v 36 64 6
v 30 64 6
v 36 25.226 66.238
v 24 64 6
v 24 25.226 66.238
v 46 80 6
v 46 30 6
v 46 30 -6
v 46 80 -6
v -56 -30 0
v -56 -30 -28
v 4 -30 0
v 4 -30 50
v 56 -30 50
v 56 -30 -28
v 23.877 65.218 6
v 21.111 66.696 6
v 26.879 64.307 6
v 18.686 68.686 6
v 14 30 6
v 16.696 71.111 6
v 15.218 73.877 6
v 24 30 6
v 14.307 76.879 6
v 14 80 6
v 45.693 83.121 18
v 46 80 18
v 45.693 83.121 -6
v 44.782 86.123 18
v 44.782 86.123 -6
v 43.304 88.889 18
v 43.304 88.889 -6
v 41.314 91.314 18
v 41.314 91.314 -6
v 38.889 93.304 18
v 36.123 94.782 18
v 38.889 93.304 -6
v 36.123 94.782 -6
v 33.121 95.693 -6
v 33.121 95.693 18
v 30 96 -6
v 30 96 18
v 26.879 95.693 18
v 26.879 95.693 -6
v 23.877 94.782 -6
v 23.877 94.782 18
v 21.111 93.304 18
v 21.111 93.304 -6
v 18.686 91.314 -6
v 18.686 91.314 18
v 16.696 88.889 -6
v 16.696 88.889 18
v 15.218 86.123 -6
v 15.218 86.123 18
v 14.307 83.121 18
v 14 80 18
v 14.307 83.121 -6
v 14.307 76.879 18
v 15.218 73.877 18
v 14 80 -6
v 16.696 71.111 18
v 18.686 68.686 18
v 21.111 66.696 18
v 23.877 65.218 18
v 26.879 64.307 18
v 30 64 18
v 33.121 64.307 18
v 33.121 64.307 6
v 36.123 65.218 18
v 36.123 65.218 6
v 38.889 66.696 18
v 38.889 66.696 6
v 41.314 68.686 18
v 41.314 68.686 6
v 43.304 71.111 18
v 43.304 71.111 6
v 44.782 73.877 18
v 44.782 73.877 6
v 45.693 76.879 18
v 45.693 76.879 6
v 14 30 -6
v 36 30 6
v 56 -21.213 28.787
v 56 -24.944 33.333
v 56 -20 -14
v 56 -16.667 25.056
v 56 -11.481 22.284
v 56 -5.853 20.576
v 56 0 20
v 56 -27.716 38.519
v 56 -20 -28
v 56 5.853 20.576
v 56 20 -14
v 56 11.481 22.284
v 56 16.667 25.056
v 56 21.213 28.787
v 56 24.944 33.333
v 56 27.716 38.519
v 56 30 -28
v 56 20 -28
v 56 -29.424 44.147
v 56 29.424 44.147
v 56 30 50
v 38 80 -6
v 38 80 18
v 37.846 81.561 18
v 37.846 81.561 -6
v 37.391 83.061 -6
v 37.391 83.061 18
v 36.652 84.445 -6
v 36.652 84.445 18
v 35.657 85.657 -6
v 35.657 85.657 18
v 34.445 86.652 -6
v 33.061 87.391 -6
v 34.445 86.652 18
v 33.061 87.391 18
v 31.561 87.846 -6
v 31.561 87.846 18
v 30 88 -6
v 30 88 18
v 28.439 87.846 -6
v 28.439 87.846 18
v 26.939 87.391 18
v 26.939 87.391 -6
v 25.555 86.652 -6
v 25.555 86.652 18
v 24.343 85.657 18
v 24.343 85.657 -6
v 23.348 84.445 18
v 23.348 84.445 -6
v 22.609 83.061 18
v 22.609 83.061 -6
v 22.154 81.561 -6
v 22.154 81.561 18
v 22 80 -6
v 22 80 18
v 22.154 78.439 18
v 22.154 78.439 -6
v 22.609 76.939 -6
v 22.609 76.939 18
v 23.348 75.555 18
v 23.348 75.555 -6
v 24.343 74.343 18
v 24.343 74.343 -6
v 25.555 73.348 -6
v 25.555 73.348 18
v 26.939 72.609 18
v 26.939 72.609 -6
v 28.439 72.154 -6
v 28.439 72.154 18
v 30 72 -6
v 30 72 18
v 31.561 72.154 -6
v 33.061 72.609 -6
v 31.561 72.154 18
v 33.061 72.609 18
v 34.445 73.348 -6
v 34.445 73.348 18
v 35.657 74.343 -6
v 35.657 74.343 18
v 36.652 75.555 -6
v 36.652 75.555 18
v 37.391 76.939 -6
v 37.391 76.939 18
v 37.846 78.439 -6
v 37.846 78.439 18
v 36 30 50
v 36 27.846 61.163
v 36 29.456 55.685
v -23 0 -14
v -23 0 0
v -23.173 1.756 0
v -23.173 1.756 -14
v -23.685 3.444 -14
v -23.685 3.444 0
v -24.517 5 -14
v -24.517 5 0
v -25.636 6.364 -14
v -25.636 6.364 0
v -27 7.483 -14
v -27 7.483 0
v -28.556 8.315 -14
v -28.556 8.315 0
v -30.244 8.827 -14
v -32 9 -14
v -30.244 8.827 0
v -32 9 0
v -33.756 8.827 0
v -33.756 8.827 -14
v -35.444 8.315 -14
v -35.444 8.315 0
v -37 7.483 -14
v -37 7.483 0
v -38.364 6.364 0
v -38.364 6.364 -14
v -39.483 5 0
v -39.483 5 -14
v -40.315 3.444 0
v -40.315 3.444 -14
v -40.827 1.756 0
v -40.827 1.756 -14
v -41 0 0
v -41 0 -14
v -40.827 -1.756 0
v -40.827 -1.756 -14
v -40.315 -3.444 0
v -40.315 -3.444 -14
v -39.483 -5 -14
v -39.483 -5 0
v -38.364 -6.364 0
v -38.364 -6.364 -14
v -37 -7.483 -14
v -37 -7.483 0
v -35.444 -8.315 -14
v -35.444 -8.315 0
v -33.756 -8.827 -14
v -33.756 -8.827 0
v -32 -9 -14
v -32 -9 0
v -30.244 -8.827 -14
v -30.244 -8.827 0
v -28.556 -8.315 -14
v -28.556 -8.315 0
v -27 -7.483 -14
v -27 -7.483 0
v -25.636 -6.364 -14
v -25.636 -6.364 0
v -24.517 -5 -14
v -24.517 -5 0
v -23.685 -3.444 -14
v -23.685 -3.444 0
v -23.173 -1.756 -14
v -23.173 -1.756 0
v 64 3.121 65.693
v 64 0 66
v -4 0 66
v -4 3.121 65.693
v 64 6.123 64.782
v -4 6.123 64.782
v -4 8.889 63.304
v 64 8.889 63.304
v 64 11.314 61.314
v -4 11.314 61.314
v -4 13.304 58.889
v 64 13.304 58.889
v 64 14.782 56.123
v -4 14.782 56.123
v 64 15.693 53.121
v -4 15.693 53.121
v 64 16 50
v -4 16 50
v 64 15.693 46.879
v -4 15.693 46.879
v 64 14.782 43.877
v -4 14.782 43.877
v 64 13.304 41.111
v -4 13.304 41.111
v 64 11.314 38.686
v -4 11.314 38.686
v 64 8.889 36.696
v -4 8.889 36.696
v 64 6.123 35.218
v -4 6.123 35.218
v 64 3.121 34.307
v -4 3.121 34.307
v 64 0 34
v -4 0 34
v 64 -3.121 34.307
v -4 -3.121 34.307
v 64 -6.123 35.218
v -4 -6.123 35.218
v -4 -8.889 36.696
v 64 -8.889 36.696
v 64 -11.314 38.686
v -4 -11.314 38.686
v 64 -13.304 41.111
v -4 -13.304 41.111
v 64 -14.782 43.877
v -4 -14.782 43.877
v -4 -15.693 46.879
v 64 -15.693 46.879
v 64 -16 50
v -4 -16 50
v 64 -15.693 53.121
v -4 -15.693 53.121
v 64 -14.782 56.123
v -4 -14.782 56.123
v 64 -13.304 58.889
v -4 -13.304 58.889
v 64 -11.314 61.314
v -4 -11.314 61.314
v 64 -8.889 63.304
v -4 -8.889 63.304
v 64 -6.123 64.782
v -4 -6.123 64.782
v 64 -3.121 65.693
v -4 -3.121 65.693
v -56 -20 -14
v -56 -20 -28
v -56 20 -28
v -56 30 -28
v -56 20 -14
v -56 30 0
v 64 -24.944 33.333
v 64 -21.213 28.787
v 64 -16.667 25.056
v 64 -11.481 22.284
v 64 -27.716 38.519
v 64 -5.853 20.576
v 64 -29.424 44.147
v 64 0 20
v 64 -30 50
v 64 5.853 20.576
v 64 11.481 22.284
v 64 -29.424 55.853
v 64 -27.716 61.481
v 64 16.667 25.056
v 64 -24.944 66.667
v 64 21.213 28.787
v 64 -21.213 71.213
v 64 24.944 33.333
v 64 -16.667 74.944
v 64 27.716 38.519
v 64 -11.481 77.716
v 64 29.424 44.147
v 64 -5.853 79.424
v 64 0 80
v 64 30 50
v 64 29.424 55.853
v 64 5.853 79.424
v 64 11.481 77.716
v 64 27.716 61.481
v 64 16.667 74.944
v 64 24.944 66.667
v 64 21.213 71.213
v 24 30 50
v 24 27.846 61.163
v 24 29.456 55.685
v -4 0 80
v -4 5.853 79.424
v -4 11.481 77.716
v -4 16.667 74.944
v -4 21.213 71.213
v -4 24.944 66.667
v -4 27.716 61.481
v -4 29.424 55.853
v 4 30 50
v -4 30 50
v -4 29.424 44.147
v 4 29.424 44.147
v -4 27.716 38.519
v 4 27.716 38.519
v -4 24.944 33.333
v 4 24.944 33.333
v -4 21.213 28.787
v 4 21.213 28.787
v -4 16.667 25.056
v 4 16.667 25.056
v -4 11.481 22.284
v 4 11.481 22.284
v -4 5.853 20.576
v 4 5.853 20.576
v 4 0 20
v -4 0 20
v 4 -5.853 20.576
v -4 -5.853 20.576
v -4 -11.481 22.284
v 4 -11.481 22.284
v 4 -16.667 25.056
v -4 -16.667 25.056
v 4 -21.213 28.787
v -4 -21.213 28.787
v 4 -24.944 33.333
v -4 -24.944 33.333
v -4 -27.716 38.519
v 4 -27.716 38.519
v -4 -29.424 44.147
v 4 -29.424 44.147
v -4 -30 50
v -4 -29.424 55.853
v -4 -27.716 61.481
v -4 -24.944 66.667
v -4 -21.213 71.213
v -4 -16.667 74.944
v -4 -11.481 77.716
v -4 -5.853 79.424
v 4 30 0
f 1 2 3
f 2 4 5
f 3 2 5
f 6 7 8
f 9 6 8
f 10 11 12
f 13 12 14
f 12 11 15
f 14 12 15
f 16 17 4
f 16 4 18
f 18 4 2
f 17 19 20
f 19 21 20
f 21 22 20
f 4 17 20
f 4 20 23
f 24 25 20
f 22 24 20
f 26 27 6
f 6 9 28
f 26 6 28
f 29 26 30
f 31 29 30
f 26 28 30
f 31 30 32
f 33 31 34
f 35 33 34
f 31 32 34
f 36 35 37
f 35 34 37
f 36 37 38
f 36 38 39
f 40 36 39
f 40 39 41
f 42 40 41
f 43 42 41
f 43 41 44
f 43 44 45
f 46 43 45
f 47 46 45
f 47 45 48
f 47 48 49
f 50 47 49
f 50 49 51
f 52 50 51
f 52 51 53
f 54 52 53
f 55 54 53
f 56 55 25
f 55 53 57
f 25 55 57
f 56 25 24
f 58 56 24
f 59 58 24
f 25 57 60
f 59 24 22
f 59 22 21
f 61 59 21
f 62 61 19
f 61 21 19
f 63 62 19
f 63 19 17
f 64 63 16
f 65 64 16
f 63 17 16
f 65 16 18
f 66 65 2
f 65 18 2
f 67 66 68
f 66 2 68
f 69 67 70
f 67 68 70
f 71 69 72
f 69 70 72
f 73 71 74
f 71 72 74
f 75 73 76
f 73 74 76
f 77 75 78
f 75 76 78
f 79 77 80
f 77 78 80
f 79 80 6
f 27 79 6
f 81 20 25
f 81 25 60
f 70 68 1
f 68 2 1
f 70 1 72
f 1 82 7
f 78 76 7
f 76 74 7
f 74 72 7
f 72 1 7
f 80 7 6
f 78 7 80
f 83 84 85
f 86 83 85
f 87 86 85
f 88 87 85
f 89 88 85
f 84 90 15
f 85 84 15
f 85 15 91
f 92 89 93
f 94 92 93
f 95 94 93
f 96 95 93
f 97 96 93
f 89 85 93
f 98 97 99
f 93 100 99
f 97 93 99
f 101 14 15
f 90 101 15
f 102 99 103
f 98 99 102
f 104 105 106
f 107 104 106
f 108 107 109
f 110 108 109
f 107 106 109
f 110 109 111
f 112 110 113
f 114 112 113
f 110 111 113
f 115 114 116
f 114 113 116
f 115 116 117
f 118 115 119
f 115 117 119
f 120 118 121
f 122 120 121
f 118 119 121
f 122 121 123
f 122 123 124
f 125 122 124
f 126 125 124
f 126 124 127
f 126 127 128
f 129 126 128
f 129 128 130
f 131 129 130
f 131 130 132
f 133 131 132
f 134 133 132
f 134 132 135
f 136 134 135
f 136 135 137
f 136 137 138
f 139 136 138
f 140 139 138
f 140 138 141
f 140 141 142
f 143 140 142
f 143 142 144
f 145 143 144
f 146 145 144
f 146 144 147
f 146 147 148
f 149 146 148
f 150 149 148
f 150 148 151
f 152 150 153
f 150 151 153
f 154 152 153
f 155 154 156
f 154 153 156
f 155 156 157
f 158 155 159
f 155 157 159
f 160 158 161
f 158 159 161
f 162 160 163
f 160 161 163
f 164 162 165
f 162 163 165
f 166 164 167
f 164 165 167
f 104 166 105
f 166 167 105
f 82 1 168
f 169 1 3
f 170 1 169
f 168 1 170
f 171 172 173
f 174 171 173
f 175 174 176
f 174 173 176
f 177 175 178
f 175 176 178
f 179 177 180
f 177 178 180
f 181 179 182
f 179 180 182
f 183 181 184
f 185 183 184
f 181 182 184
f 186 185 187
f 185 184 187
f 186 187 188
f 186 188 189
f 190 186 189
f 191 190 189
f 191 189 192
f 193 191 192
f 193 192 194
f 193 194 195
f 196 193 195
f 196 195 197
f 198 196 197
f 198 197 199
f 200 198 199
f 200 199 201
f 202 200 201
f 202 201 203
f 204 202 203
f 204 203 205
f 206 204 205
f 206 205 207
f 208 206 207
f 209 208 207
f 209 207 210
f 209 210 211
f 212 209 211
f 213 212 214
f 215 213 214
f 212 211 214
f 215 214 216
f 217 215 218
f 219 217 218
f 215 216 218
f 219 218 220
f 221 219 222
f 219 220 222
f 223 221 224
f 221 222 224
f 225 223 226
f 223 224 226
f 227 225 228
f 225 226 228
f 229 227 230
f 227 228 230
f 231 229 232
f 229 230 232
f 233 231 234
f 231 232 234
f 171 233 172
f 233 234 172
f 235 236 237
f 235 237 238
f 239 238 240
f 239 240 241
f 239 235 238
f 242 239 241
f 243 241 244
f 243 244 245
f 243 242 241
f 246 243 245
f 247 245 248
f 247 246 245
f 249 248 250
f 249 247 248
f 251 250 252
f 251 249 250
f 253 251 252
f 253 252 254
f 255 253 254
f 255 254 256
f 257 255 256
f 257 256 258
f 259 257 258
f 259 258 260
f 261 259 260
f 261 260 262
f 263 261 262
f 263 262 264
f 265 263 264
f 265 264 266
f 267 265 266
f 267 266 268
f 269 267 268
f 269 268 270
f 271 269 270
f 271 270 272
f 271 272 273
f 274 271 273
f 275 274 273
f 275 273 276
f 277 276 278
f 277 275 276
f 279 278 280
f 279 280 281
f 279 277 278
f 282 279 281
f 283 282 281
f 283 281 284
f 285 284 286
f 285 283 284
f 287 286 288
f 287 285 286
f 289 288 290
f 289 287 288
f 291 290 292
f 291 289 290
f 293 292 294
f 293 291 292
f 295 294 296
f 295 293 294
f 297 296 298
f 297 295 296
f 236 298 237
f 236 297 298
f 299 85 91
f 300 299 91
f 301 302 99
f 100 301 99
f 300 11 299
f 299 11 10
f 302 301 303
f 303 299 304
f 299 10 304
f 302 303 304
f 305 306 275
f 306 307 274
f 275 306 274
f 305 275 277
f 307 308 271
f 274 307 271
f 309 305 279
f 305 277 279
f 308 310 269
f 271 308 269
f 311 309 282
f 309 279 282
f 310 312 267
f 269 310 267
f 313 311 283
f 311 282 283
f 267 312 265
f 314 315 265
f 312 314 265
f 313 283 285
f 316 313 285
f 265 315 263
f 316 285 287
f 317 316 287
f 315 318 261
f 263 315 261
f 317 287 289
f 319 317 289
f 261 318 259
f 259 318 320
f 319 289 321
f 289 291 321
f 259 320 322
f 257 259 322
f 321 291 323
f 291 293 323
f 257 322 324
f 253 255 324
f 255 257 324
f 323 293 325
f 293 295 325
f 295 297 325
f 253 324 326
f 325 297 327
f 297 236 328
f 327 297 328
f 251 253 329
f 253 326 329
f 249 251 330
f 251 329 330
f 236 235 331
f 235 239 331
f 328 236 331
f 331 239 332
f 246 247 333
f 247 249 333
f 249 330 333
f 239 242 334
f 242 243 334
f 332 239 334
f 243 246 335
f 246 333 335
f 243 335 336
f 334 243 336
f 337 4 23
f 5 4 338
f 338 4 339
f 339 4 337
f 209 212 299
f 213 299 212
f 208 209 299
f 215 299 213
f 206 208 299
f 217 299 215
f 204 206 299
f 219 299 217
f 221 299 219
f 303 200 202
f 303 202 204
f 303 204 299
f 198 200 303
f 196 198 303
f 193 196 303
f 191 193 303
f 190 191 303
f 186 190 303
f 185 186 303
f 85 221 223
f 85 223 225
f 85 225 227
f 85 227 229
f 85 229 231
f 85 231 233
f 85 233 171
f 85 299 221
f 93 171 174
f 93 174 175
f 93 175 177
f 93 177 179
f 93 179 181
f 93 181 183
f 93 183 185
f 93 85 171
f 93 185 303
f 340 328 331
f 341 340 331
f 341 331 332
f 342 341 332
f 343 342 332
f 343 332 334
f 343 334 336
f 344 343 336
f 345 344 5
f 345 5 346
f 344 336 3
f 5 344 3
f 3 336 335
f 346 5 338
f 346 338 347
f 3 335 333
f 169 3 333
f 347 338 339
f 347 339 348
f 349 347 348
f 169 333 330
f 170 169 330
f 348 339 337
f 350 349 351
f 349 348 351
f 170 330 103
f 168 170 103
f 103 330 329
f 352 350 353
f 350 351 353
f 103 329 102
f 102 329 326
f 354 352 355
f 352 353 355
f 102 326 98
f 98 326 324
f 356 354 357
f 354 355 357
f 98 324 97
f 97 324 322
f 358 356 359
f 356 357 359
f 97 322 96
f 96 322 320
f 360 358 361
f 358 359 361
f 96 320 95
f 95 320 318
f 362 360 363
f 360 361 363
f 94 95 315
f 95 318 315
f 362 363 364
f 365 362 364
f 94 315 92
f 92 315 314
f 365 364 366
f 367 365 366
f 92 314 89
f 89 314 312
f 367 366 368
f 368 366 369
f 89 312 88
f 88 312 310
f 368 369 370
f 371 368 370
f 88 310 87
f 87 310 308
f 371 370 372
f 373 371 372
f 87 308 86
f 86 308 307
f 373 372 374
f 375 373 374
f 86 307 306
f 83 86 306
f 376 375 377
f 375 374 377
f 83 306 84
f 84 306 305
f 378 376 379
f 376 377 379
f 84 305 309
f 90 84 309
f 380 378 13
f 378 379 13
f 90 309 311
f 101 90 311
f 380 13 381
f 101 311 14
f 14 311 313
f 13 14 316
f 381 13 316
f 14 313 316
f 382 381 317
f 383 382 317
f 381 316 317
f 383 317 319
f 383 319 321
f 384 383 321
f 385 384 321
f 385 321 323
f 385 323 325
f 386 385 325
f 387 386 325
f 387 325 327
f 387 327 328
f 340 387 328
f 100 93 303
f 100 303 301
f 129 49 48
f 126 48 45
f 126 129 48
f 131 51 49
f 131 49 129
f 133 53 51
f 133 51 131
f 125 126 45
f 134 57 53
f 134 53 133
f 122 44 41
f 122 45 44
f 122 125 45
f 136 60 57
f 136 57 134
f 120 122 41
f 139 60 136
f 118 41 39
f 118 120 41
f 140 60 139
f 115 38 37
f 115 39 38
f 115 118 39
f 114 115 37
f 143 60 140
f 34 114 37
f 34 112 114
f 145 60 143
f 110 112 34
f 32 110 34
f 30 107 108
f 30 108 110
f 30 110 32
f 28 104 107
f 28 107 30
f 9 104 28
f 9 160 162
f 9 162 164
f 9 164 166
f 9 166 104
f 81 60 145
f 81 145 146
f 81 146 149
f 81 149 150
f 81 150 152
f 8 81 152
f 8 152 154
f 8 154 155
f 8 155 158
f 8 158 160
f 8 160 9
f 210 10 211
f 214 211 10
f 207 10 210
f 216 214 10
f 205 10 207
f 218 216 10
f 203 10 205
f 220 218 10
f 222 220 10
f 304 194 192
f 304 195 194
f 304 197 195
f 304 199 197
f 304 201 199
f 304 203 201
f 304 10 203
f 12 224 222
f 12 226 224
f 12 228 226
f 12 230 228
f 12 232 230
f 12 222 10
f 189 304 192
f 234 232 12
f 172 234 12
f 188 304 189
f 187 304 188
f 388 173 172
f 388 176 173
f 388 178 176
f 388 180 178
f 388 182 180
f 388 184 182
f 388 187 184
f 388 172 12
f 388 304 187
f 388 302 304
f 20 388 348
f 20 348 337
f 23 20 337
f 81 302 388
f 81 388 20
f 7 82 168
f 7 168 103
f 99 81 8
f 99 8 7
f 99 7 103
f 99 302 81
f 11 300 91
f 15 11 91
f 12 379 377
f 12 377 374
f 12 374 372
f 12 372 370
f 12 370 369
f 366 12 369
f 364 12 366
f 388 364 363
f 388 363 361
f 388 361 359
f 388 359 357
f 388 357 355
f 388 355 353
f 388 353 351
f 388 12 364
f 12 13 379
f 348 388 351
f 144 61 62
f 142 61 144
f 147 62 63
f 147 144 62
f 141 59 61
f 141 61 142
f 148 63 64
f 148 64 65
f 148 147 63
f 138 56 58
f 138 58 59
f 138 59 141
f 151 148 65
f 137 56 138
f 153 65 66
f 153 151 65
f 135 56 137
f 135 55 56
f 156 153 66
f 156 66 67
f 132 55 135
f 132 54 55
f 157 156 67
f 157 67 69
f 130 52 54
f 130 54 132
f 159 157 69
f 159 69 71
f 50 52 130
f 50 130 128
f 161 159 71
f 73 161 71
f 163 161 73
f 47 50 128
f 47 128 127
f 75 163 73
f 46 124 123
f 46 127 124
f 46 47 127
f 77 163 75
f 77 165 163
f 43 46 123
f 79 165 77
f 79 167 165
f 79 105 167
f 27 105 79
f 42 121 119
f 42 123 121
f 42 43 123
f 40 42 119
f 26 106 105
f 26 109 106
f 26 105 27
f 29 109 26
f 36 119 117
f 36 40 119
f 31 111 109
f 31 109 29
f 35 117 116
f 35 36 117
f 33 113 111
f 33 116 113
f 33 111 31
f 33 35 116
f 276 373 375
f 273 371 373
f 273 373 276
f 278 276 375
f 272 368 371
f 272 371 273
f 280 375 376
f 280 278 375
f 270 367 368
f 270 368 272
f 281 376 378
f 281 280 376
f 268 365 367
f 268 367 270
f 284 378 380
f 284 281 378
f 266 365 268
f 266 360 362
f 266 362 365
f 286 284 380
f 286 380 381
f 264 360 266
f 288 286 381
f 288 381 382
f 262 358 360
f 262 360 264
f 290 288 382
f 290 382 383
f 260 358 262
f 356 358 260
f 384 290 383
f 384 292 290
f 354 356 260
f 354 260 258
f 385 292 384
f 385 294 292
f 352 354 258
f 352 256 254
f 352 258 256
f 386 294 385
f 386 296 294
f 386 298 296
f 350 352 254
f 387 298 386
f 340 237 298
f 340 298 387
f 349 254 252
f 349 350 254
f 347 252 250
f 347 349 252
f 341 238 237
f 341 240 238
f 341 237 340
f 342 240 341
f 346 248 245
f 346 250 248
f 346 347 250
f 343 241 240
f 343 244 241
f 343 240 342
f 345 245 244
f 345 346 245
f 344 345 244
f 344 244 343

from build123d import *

# Parameters (mm, degrees)
SKETCH1_W                = 112
SKETCH1_H                = 60
BOSS_EXTRUDE1_DEPTH      = 28
SKETCH2_W                = 14
SKETCH2_H                = 40
CUT_EXTRUDE1_DEPTH       = 120.28118041
SKETCH3_W                = 52
SKETCH3_H                = 60
BOSS_EXTRUDE2_DEPTH      = 50
BOSS_EXTRUDE3_DEPTH      = 8
BOSS_EXTRUDE3_DEPTH_BACK = 60
SKETCH4_R                = 30
SKETCH4_R_2              = 16
SKETCH5_R                = 16
CUT_EXTRUDE2_DEPTH       = 105.403065089
SKETCH6_W                = 32
SKETCH6_H                = 12
BOSS_EXTRUDE4_DEPTH      = 50
BOSS_EXTRUDE5_DEPTH      = 12
BOSS_EXTRUDE5_DEPTH_BACK = 12
SKETCH8_R                = 16
SKETCH8_R_2              = 8
SKETCH9_R                = 8
CUT_EXTRUDE3_DEPTH       = 138.069325525
RIB1_REACH               = 153.697
SKETCH17_WALL_W          = 377.032111856
SKETCH17_WALL_H          = 12
SKETCH18_R               = 9
CUT_EXTRUDE4_DEPTH       = 141.399430198


with BuildPart() as part:
    # Sketch1 → Boss-Extrude1 (new body)
    with BuildSketch(Plane.XY):
        Rectangle(SKETCH1_W, SKETCH1_H)
    extrude(amount=-BOSS_EXTRUDE1_DEPTH)

    # Sketch2 → Cut-Extrude1 (cut, through all)
    with BuildSketch(Plane(origin=(56, 0, 0), x_dir=(0, 0, -1), z_dir=(1, 0, 0))):
        with Locations((21, 0)):
            Rectangle(SKETCH2_W, SKETCH2_H)
    extrude(amount=-CUT_EXTRUDE1_DEPTH, mode=Mode.SUBTRACT)

    # Sketch3 → Boss-Extrude2 (add)
    with BuildSketch(Plane.XY):
        with Locations((30, 0)):
            Rectangle(SKETCH3_W, SKETCH3_H)
    extrude(amount=BOSS_EXTRUDE2_DEPTH)

    # Sketch4 → Boss-Extrude3 (add, two sides: drawn at the far end of the back side and taken through both)
    with BuildSketch(Plane.ZY.offset(-4).offset(-BOSS_EXTRUDE3_DEPTH_BACK)):
        with Locations((50, 0)):
            Circle(SKETCH4_R)
        with Locations((50, 0)):
            Circle(SKETCH4_R_2, mode=Mode.SUBTRACT)
    extrude(amount=BOSS_EXTRUDE3_DEPTH + BOSS_EXTRUDE3_DEPTH_BACK)

    # Sketch5 → Cut-Extrude2 (cut, through all)
    with BuildSketch(Plane.ZY.offset(-4)):
        with Locations((50, 0)):
            Circle(SKETCH5_R)
    extrude(amount=-CUT_EXTRUDE2_DEPTH, mode=Mode.SUBTRACT)

    # Sketch6 → Boss-Extrude4 (add)
    with BuildSketch(Plane(origin=(0, 30, 0), x_dir=(1, 0, 0), z_dir=(0, 1, 0))):
        with Locations((30, 0)):
            Rectangle(SKETCH6_W, SKETCH6_H)
    extrude(amount=BOSS_EXTRUDE4_DEPTH)

    # Sketch8 → Boss-Extrude5 (add, two sides: drawn at the far end of the back side and taken through both)
    with BuildSketch(Plane.XY.offset(6).offset(-BOSS_EXTRUDE5_DEPTH_BACK)):
        with Locations((30, 80)):
            Circle(SKETCH8_R)
        with Locations((30, 80)):
            Circle(SKETCH8_R_2, mode=Mode.SUBTRACT)
    extrude(amount=BOSS_EXTRUDE5_DEPTH + BOSS_EXTRUDE5_DEPTH_BACK)

    # Sketch9 → Cut-Extrude3 (cut, through all)
    with BuildSketch(Plane.XY.offset(6)):
        with Locations((30, 80)):
            Circle(SKETCH9_R)
    extrude(amount=-CUT_EXTRUDE3_DEPTH, mode=Mode.SUBTRACT)

    # Sketch17 wall → Rib1 (add, up to next)
    with BuildSketch(Plane(origin=(30, 44.612908816, 36.118776459), x_dir=(0, -0.541251763971, 0.84086058773), z_dir=(0, -0.84086058773, -0.541251763971)), mode=Mode.PRIVATE) as rib1_sk1:
        Rectangle(SKETCH17_WALL_W, SKETCH17_WALL_H)
    rib1_tool1 = extrude(rib1_sk1.sketch, amount=RIB1_REACH, mode=Mode.PRIVATE) - part.part
    add(rib1_tool1.solids().sort_by_distance((30, 44.612908816, 36.118776459))[0])

    # Sketch18 → Cut-Extrude4 (cut, through all)
    with BuildSketch(Plane.XY):
        with Locations((-32, 0)):
            Circle(SKETCH18_R)
    extrude(amount=-CUT_EXTRUDE4_DEPTH, mode=Mode.SUBTRACT)


solid = part.part
